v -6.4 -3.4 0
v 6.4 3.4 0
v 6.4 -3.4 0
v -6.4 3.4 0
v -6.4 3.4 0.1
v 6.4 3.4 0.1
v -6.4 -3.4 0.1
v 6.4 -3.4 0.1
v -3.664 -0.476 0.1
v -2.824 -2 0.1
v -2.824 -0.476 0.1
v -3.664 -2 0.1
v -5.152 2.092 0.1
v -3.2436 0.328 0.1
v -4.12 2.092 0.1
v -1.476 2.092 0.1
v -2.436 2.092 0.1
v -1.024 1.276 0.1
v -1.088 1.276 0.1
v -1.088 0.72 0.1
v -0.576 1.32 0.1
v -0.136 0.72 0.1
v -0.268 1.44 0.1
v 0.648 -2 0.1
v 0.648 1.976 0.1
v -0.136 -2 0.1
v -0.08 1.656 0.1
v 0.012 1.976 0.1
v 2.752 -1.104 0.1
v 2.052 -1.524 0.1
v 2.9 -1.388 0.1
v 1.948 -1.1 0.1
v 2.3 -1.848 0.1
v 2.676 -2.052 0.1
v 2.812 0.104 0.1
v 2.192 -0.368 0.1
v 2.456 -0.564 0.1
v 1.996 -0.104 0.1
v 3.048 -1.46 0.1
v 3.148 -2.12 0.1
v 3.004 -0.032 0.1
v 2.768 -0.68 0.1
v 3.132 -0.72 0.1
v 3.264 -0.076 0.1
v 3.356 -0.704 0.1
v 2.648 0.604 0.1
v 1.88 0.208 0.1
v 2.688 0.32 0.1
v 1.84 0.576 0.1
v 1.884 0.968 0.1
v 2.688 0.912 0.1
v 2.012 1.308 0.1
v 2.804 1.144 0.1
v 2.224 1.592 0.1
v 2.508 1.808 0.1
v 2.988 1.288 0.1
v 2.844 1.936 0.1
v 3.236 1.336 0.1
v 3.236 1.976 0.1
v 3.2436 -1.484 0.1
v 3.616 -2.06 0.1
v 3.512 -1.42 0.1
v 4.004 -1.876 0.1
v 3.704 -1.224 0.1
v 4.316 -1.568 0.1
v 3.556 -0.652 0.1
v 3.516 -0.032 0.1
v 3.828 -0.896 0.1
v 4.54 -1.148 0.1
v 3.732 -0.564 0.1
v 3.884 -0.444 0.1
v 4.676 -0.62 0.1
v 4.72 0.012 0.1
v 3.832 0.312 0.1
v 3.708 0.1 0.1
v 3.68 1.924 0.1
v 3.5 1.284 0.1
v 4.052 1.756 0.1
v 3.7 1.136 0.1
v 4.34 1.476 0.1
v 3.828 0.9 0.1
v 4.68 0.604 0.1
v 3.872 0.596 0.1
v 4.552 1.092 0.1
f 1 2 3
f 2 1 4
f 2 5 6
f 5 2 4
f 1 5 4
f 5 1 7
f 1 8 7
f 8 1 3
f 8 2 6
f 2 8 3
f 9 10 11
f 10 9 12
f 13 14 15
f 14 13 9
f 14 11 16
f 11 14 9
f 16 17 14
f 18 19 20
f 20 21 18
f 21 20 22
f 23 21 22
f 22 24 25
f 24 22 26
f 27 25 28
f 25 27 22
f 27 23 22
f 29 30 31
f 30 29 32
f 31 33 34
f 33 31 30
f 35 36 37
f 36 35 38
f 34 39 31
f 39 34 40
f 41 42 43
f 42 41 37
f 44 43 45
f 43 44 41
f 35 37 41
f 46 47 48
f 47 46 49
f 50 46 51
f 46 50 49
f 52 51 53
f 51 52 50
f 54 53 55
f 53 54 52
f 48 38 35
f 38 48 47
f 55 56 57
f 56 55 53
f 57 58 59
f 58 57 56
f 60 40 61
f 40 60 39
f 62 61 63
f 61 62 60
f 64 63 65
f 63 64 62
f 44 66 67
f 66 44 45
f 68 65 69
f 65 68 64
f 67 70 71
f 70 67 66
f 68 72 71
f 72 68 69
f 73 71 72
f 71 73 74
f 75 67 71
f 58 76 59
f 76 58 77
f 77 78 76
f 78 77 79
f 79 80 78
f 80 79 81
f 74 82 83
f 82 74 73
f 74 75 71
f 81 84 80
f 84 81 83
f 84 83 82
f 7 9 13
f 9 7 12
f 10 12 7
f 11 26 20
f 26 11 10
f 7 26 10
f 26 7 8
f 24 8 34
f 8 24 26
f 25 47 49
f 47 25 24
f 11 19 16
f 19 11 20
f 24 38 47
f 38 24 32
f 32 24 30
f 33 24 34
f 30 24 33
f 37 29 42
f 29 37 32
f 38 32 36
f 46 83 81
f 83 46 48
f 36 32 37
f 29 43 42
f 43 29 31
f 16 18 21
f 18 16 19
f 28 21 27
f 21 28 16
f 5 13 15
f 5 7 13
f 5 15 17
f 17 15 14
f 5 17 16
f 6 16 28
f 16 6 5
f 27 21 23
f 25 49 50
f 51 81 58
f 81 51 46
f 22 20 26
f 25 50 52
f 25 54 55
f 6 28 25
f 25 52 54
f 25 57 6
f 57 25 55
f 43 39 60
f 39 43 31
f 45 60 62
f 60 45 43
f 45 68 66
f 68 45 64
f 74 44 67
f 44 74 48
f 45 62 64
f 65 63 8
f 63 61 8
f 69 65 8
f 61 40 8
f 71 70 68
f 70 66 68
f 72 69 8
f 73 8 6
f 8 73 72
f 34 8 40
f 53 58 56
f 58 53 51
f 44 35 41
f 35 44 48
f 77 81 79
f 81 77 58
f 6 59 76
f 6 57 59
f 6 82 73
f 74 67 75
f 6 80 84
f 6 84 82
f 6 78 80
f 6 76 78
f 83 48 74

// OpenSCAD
// file: ../p/box5-12.scad
use <../lib.scad>
function ldraw_lib__box5_12() = [
// 0 Box with 5 Faces without Any Edges
// 0 Name: box5-12.dat
// 0 Author: Chris Dee [cwdee]
// 0 !LDRAW_ORG Primitive UPDATE 2009-02
// 0 !LICENSE Licensed under CC BY 2.0 and CC BY 4.0 : see CAreadme.txt
// 
// 0 BFC CERTIFY CCW
  [0,"BFC","CERTIFY"],
  [0,"BFC","CCW"],
// 
// 0 !HISTORY 2009-09-03 [PTadmin] Official Update 2009-02
// 
// 
// 4 16 1 1 1 1 1 -1 -1 1 -1 -1 1 1
  [4,16,1,1,1,1,1,-1,-1,1,-1,-1,1,1],
// 4 16 -1 0 1 1 0 1 1 1 1 -1 1 1
  [4,16,-1,0,1,1,0,1,1,1,1,-1,1,1],
// 4 16 -1 0 -1 -1 0 1 -1 1 1 -1 1 -1
  [4,16,-1,0,-1,-1,0,1,-1,1,1,-1,1,-1],
// 4 16 1 0 -1 -1 0 -1 -1 1 -1 1 1 -1
  [4,16,1,0,-1,-1,0,-1,-1,1,-1,1,1,-1],
// 4 16 1 0 1 1 0 -1 1 1 -1 1 1 1
  [4,16,1,0,1,1,0,-1,1,1,-1,1,1,1],
// 0
];
module ldraw_lib__box5_12(step=0, col=false, unit=2/5, alt=false, line=0.2, solid=!$preview)
    makepoly(ldraw_lib__box5_12(), step=step, col=col, unit=unit, alt=alt, line=line, solid=solid);
ldraw_lib__box5_12(line=0.2);
// main file
use <../lib.scad>
use <../p/box5-12.scad>
function ldraw_lib__820673n() = [
// 0 Sticker  0.9 x  1.6 with White "Y19" on Transparent Background
// 0 Name: 820673n.dat
// 0 Author: Takeshi Takahashi [RainbowDolphin]
// 0 !LDRAW_ORG Part UPDATE 2022-04
// 0 !LICENSE Licensed under CC BY 2.0 and CC BY 4.0 : see CAreadme.txt
// 
// 0 BFC CERTIFY CCW
  [0,"BFC","CERTIFY"],
  [0,"BFC","CCW"],
// 
// 0 !KEYWORDS harbour, Pilot boat, Seaport, Set 6542, ship
// 
// 0 !HISTORY 2022-07-18 [PTadmin] Official Update 2022-04
// 
// 
// 1 16 0 -0.25 0 16 0 0 0 0.25 0 0 0 8.5 box5-12.dat
  [1,16,0,-0.25,0,16,0,0,0,0.25,0,0,0,8.5, ldraw_lib__box5_12()],
// 0 BFC NOCLIP
  [0,"BFC","NOCLIP"],
// 4 15 -9.16 -0.25 -1.19 -9.16 -0.25 -5 -7.06 -0.25 -5 -7.06 -0.25 -1.19
  [4,15,-9.16,-0.25,-1.19,-9.16,-0.25,-5,-7.06,-0.25,-5,-7.06,-0.25,-1.19],
// 4 15 -8.109 -0.25 0.82 -10.3 -0.25 5.23 -12.88 -0.25 5.23 -9.16 -0.25 -1.19
  [4,15,-8.109,-0.25,0.82,-10.3,-0.25,5.23,-12.88,-0.25,5.23,-9.16,-0.25,-1.19],
// 4 15 -8.109 -0.25 0.82 -9.16 -0.25 -1.19 -7.06 -0.25 -1.19 -3.69 -0.25 5.23
  [4,15,-8.109,-0.25,0.82,-9.16,-0.25,-1.19,-7.06,-0.25,-1.19,-3.69,-0.25,5.23],
// 3 15 -3.69 -0.25 5.23 -6.09 -0.25 5.23 -8.109 -0.25 0.82
  [3,15,-3.69,-0.25,5.23,-6.09,-0.25,5.23,-8.109,-0.25,0.82],
// 3 15 -2.56 -0.25 3.19 -2.72 -0.25 3.19 -2.72 -0.25 1.8
  [3,15,-2.56,-0.25,3.19,-2.72,-0.25,3.19,-2.72,-0.25,1.8],
// 4 15 -1.44 -0.25 3.3 -2.56 -0.25 3.19 -2.72 -0.25 1.8 -0.34 -0.25 1.8
  [4,15,-1.44,-0.25,3.3,-2.56,-0.25,3.19,-2.72,-0.25,1.8,-0.34,-0.25,1.8],
// 3 15 -0.67 -0.25 3.6 -1.44 -0.25 3.3 -0.34 -0.25 1.8
  [3,15,-0.67,-0.25,3.6,-1.44,-0.25,3.3,-0.34,-0.25,1.8],
// 4 15 -0.34 -0.25 1.8 -0.34 -0.25 -5 1.62 -0.25 -5 1.62 -0.25 4.94
  [4,15,-0.34,-0.25,1.8,-0.34,-0.25,-5,1.62,-0.25,-5,1.62,-0.25,4.94],
// 4 15 1.62 -0.25 4.94 0.03 -0.25 4.94 -0.2 -0.25 4.14 -0.34 -0.25 1.8
  [4,15,1.62,-0.25,4.94,0.03,-0.25,4.94,-0.2,-0.25,4.14,-0.34,-0.25,1.8],
// 3 15 -0.2 -0.25 4.14 -0.67 -0.25 3.6 -0.34 -0.25 1.8
  [3,15,-0.2,-0.25,4.14,-0.67,-0.25,3.6,-0.34,-0.25,1.8],
// 4 15 6.88 -0.25 -2.76 4.87 -0.25 -2.75 5.13 -0.25 -3.81 7.25 -0.25 -3.47
  [4,15,6.88,-0.25,-2.76,4.87,-0.25,-2.75,5.13,-0.25,-3.81,7.25,-0.25,-3.47],
// 4 15 7.25 -0.25 -3.47 5.13 -0.25 -3.81 5.75 -0.25 -4.62 6.69 -0.25 -5.13
  [4,15,7.25,-0.25,-3.47,5.13,-0.25,-3.81,5.75,-0.25,-4.62,6.69,-0.25,-5.13],
// 4 15 7.03 -0.25 0.26 4.99 -0.25 -0.26 5.48 -0.25 -0.92 6.14 -0.25 -1.41
  [4,15,7.03,-0.25,0.26,4.99,-0.25,-0.26,5.48,-0.25,-0.92,6.14,-0.25,-1.41],
// 4 15 7.62 -0.25 -3.65 7.25 -0.25 -3.47 6.69 -0.25 -5.13 7.87 -0.25 -5.3
  [4,15,7.62,-0.25,-3.65,7.25,-0.25,-3.47,6.69,-0.25,-5.13,7.87,-0.25,-5.3],
// 4 15 6.92 -0.25 -1.7 7.83 -0.25 -1.8 7.51 -0.25 -0.08 6.14 -0.25 -1.41
  [4,15,6.92,-0.25,-1.7,7.83,-0.25,-1.8,7.51,-0.25,-0.08,6.14,-0.25,-1.41],
// 4 15 8.16 -0.25 -0.19 7.51 -0.25 -0.08 7.83 -0.25 -1.8 8.39 -0.25 -1.76
  [4,15,8.16,-0.25,-0.19,7.51,-0.25,-0.08,7.83,-0.25,-1.8,8.39,-0.25,-1.76],
// 3 15 7.03 -0.25 0.26 6.14 -0.25 -1.41 7.51 -0.25 -0.08
  [3,15,7.03,-0.25,0.26,6.14,-0.25,-1.41,7.51,-0.25,-0.08],
// 4 15 6.62 -0.25 1.51 4.6 -0.25 1.44 4.7 -0.25 0.52 6.72 -0.25 0.8
  [4,15,6.62,-0.25,1.51,4.6,-0.25,1.44,4.7,-0.25,0.52,6.72,-0.25,0.8],
// 4 15 4.71 -0.25 2.42 4.6 -0.25 1.44 6.62 -0.25 1.51 6.72 -0.25 2.28
  [4,15,4.71,-0.25,2.42,4.6,-0.25,1.44,6.62,-0.25,1.51,6.72,-0.25,2.28],
// 4 15 5.03 -0.25 3.27 4.71 -0.25 2.42 6.72 -0.25 2.28 7.01 -0.25 2.86
  [4,15,5.03,-0.25,3.27,4.71,-0.25,2.42,6.72,-0.25,2.28,7.01,-0.25,2.86],
// 4 15 5.56 -0.25 3.98 5.03 -0.25 3.27 7.01 -0.25 2.86 6.27 -0.25 4.52
  [4,15,5.56,-0.25,3.98,5.03,-0.25,3.27,7.01,-0.25,2.86,6.27,-0.25,4.52],
// 4 15 6.72 -0.25 0.8 4.7 -0.25 0.52 4.99 -0.25 -0.26 7.03 -0.25 0.26
  [4,15,6.72,-0.25,0.8,4.7,-0.25,0.52,4.99,-0.25,-0.26,7.03,-0.25,0.26],
// 4 15 6.27 -0.25 4.52 7.01 -0.25 2.86 7.47 -0.25 3.22 7.11 -0.25 4.84
  [4,15,6.27,-0.25,4.52,7.01,-0.25,2.86,7.47,-0.25,3.22,7.11,-0.25,4.84],
// 4 15 7.11 -0.25 4.84 7.47 -0.25 3.22 8.09 -0.25 3.34 8.09 -0.25 4.94
  [4,15,7.11,-0.25,4.84,7.47,-0.25,3.22,8.09,-0.25,3.34,8.09,-0.25,4.94],
// 4 15 8.109 -0.25 -3.71 7.62 -0.25 -3.65 7.87 -0.25 -5.3 9.04 -0.25 -5.15
  [4,15,8.109,-0.25,-3.71,7.62,-0.25,-3.65,7.87,-0.25,-5.3,9.04,-0.25,-5.15],
// 4 15 8.78 -0.25 -3.55 8.109 -0.25 -3.71 9.04 -0.25 -5.15 10.01 -0.25 -4.69
  [4,15,8.78,-0.25,-3.55,8.109,-0.25,-3.71,9.04,-0.25,-5.15,10.01,-0.25,-4.69],
// 4 15 9.26 -0.25 -3.06 8.78 -0.25 -3.55 10.01 -0.25 -4.69 10.79 -0.25 -3.92
  [4,15,9.26,-0.25,-3.06,8.78,-0.25,-3.55,10.01,-0.25,-4.69,10.79,-0.25,-3.92],
// 4 15 8.16 -0.25 -0.19 8.39 -0.25 -1.76 8.89 -0.25 -1.63 8.79 -0.25 -0.08
  [4,15,8.16,-0.25,-0.19,8.39,-0.25,-1.76,8.89,-0.25,-1.63,8.79,-0.25,-0.08],
// 4 15 9.26 -0.25 -3.06 10.79 -0.25 -3.92 11.35 -0.25 -2.87 9.57 -0.25 -2.24
  [4,15,9.26,-0.25,-3.06,10.79,-0.25,-3.92,11.35,-0.25,-2.87,9.57,-0.25,-2.24],
// 4 15 9.33 -0.25 -1.41 9.71 -0.25 -1.11 8.79 -0.25 -0.08 8.89 -0.25 -1.63
  [4,15,9.33,-0.25,-1.41,9.71,-0.25,-1.11,8.79,-0.25,-0.08,8.89,-0.25,-1.63],
// 4 15 11.69 -0.25 -1.55 9.71 -0.25 -1.11 9.57 -0.25 -2.24 11.35 -0.25 -2.87
  [4,15,11.69,-0.25,-1.55,9.71,-0.25,-1.11,9.57,-0.25,-2.24,11.35,-0.25,-2.87],
// 4 15 9.71 -0.25 -1.11 11.69 -0.25 -1.55 11.8 -0.25 0.03 9.58 -0.25 0.78
  [4,15,9.71,-0.25,-1.11,11.69,-0.25,-1.55,11.8,-0.25,0.03,9.58,-0.25,0.78],
// 3 15 9.27 -0.25 0.25 8.79 -0.25 -0.08 9.71 -0.25 -1.11
  [3,15,9.27,-0.25,0.25,8.79,-0.25,-0.08,9.71,-0.25,-1.11],
// 4 15 9.2 -0.25 4.81 8.09 -0.25 4.94 8.09 -0.25 3.34 8.75 -0.25 3.21
  [4,15,9.2,-0.25,4.81,8.09,-0.25,4.94,8.09,-0.25,3.34,8.75,-0.25,3.21],
// 4 15 8.75 -0.25 3.21 9.25 -0.25 2.84 10.13 -0.25 4.39 9.2 -0.25 4.81
  [4,15,8.75,-0.25,3.21,9.25,-0.25,2.84,10.13,-0.25,4.39,9.2,-0.25,4.81],
// 4 15 9.25 -0.25 2.84 9.57 -0.25 2.25 10.85 -0.25 3.69 10.13 -0.25 4.39
  [4,15,9.25,-0.25,2.84,9.57,-0.25,2.25,10.85,-0.25,3.69,10.13,-0.25,4.39],
// 4 15 11.7 -0.25 1.51 9.68 -0.25 1.49 9.58 -0.25 0.78 11.8 -0.25 0.03
  [4,15,11.7,-0.25,1.51,9.68,-0.25,1.49,9.58,-0.25,0.78,11.8,-0.25,0.03],
// 3 15 9.58 -0.25 0.78 9.27 -0.25 0.25 9.71 -0.25 -1.11
  [3,15,9.58,-0.25,0.78,9.27,-0.25,0.25,9.71,-0.25,-1.11],
// 4 15 11.38 -0.25 2.73 10.85 -0.25 3.69 9.57 -0.25 2.25 9.68 -0.25 1.49
  [4,15,11.38,-0.25,2.73,10.85,-0.25,3.69,9.57,-0.25,2.25,9.68,-0.25,1.49],
// 3 15 11.38 -0.25 2.73 9.68 -0.25 1.49 11.7 -0.25 1.51
  [3,15,11.38,-0.25,2.73,9.68,-0.25,1.49,11.7,-0.25,1.51],
// 0 BFC CLIP
  [0,"BFC","CLIP"],
// 4 16 -12.88 -0.25 5.23 -16 -0.25 -8.5 -9.16 -0.25 -5 -9.16 -0.25 -1.19
  [4,16,-12.88,-0.25,5.23,-16,-0.25,-8.5,-9.16,-0.25,-5,-9.16,-0.25,-1.19],
// 3 16 -7.06 -0.25 -5 -9.16 -0.25 -5 -16 -0.25 -8.5
  [3,16,-7.06,-0.25,-5,-9.16,-0.25,-5,-16,-0.25,-8.5],
// 4 16 -7.06 -0.25 -1.19 -7.06 -0.25 -5 -0.34 -0.25 -5 -2.72 -0.25 1.8
  [4,16,-7.06,-0.25,-1.19,-7.06,-0.25,-5,-0.34,-0.25,-5,-2.72,-0.25,1.8],
// 4 16 -0.34 -0.25 -5 -7.06 -0.25 -5 -16 -0.25 -8.5 16 -0.25 -8.5
  [4,16,-0.34,-0.25,-5,-7.06,-0.25,-5,-16,-0.25,-8.5,16,-0.25,-8.5],
// 4 16 1.62 -0.25 -5 -0.34 -0.25 -5 16 -0.25 -8.5 6.69 -0.25 -5.13
  [4,16,1.62,-0.25,-5,-0.34,-0.25,-5,16,-0.25,-8.5,6.69,-0.25,-5.13],
// 4 16 1.62 -0.25 4.94 1.62 -0.25 -5 4.7 -0.25 0.52 4.6 -0.25 1.44
  [4,16,1.62,-0.25,4.94,1.62,-0.25,-5,4.7,-0.25,0.52,4.6,-0.25,1.44],
// 4 16 -7.06 -0.25 -1.19 -2.72 -0.25 1.8 -2.72 -0.25 3.19 -3.69 -0.25 5.23
  [4,16,-7.06,-0.25,-1.19,-2.72,-0.25,1.8,-2.72,-0.25,3.19,-3.69,-0.25,5.23],
// 4 16 4.99 -0.25 -0.26 4.7 -0.25 0.52 1.62 -0.25 -5 4.87 -0.25 -2.75
  [4,16,4.99,-0.25,-0.26,4.7,-0.25,0.52,1.62,-0.25,-5,4.87,-0.25,-2.75],
// 3 16 4.87 -0.25 -2.75 1.62 -0.25 -5 5.13 -0.25 -3.81
  [3,16,4.87,-0.25,-2.75,1.62,-0.25,-5,5.13,-0.25,-3.81],
// 3 16 5.75 -0.25 -4.62 1.62 -0.25 -5 6.69 -0.25 -5.13
  [3,16,5.75,-0.25,-4.62,1.62,-0.25,-5,6.69,-0.25,-5.13],
// 3 16 5.13 -0.25 -3.81 1.62 -0.25 -5 5.75 -0.25 -4.62
  [3,16,5.13,-0.25,-3.81,1.62,-0.25,-5,5.75,-0.25,-4.62],
// 4 16 6.14 -0.25 -1.41 4.87 -0.25 -2.75 6.88 -0.25 -2.76 6.92 -0.25 -1.7
  [4,16,6.14,-0.25,-1.41,4.87,-0.25,-2.75,6.88,-0.25,-2.76,6.92,-0.25,-1.7],
// 3 16 4.99 -0.25 -0.26 4.87 -0.25 -2.75 5.48 -0.25 -0.92
  [3,16,4.99,-0.25,-0.26,4.87,-0.25,-2.75,5.48,-0.25,-0.92],
// 4 16 6.62 -0.25 1.51 6.72 -0.25 0.8 9.68 -0.25 1.49 9.57 -0.25 2.25
  [4,16,6.62,-0.25,1.51,6.72,-0.25,0.8,9.68,-0.25,1.49,9.57,-0.25,2.25],
// 3 16 5.48 -0.25 -0.92 4.87 -0.25 -2.75 6.14 -0.25 -1.41
  [3,16,5.48,-0.25,-0.92,4.87,-0.25,-2.75,6.14,-0.25,-1.41],
// 4 16 7.83 -0.25 -1.8 6.92 -0.25 -1.7 6.88 -0.25 -2.76 7.25 -0.25 -3.47
  [4,16,7.83,-0.25,-1.8,6.92,-0.25,-1.7,6.88,-0.25,-2.76,7.25,-0.25,-3.47],
// 4 16 -2.56 -0.25 3.19 -1.44 -0.25 3.3 -3.69 -0.25 5.23 -2.72 -0.25 3.19
  [4,16,-2.56,-0.25,3.19,-1.44,-0.25,3.3,-3.69,-0.25,5.23,-2.72,-0.25,3.19],
// 4 16 0.03 -0.25 4.94 -3.69 -0.25 5.23 -1.44 -0.25 3.3 -0.2 -0.25 4.14
  [4,16,0.03,-0.25,4.94,-3.69,-0.25,5.23,-1.44,-0.25,3.3,-0.2,-0.25,4.14],
// 3 16 -16 -0.25 8.5 -12.88 -0.25 5.23 -10.3 -0.25 5.23
  [3,16,-16,-0.25,8.5,-12.88,-0.25,5.23,-10.3,-0.25,5.23],
// 3 16 -16 -0.25 8.5 -16 -0.25 -8.5 -12.88 -0.25 5.23
  [3,16,-16,-0.25,8.5,-16,-0.25,-8.5,-12.88,-0.25,5.23],
// 3 16 -16 -0.25 8.5 -10.3 -0.25 5.23 -6.09 -0.25 5.23
  [3,16,-16,-0.25,8.5,-10.3,-0.25,5.23,-6.09,-0.25,5.23],
// 3 16 -6.09 -0.25 5.23 -10.3 -0.25 5.23 -8.109 -0.25 0.82
  [3,16,-6.09,-0.25,5.23,-10.3,-0.25,5.23,-8.109,-0.25,0.82],
// 3 16 -16 -0.25 8.5 -6.09 -0.25 5.23 -3.69 -0.25 5.23
  [3,16,-16,-0.25,8.5,-6.09,-0.25,5.23,-3.69,-0.25,5.23],
// 4 16 -16 -0.25 8.5 -3.69 -0.25 5.23 0.03 -0.25 4.94 16 -0.25 8.5
  [4,16,-16,-0.25,8.5,-3.69,-0.25,5.23,0.03,-0.25,4.94,16,-0.25,8.5],
// 3 16 -0.2 -0.25 4.14 -1.44 -0.25 3.3 -0.67 -0.25 3.6
  [3,16,-0.2,-0.25,4.14,-1.44,-0.25,3.3,-0.67,-0.25,3.6],
// 3 16 1.62 -0.25 4.94 4.6 -0.25 1.44 4.71 -0.25 2.42
  [3,16,1.62,-0.25,4.94,4.6,-0.25,1.44,4.71,-0.25,2.42],
// 4 16 6.72 -0.25 2.28 6.62 -0.25 1.51 9.57 -0.25 2.25 8.09 -0.25 3.34
  [4,16,6.72,-0.25,2.28,6.62,-0.25,1.51,9.57,-0.25,2.25,8.09,-0.25,3.34],
// 3 16 -0.34 -0.25 1.8 -2.72 -0.25 1.8 -0.34 -0.25 -5
  [3,16,-0.34,-0.25,1.8,-2.72,-0.25,1.8,-0.34,-0.25,-5],
// 3 16 1.62 -0.25 4.94 4.71 -0.25 2.42 5.03 -0.25 3.27
  [3,16,1.62,-0.25,4.94,4.71,-0.25,2.42,5.03,-0.25,3.27],
// 3 16 1.62 -0.25 4.94 5.56 -0.25 3.98 6.27 -0.25 4.52
  [3,16,1.62,-0.25,4.94,5.56,-0.25,3.98,6.27,-0.25,4.52],
// 3 16 16 -0.25 8.5 0.03 -0.25 4.94 1.62 -0.25 4.94
  [3,16,16,-0.25,8.5,0.03,-0.25,4.94,1.62,-0.25,4.94],
// 3 16 1.62 -0.25 4.94 5.03 -0.25 3.27 5.56 -0.25 3.98
  [3,16,1.62,-0.25,4.94,5.03,-0.25,3.27,5.56,-0.25,3.98],
// 4 16 1.62 -0.25 4.94 6.27 -0.25 4.52 7.11 -0.25 4.84 16 -0.25 8.5
  [4,16,1.62,-0.25,4.94,6.27,-0.25,4.52,7.11,-0.25,4.84,16,-0.25,8.5],
// 4 16 7.83 -0.25 -1.8 7.25 -0.25 -3.47 7.62 -0.25 -3.65 8.109 -0.25 -3.71
  [4,16,7.83,-0.25,-1.8,7.25,-0.25,-3.47,7.62,-0.25,-3.65,8.109,-0.25,-3.71],
// 4 16 8.109 -0.25 -3.71 8.78 -0.25 -3.55 8.39 -0.25 -1.76 7.83 -0.25 -1.8
  [4,16,8.109,-0.25,-3.71,8.78,-0.25,-3.55,8.39,-0.25,-1.76,7.83,-0.25,-1.8],
// 4 16 9.57 -0.25 -2.24 8.89 -0.25 -1.63 8.39 -0.25 -1.76 9.26 -0.25 -3.06
  [4,16,9.57,-0.25,-2.24,8.89,-0.25,-1.63,8.39,-0.25,-1.76,9.26,-0.25,-3.06],
// 4 16 8.16 -0.25 -0.19 8.79 -0.25 -0.08 9.58 -0.25 0.78 6.72 -0.25 0.8
  [4,16,8.16,-0.25,-0.19,8.79,-0.25,-0.08,9.58,-0.25,0.78,6.72,-0.25,0.8],
// 3 16 8.39 -0.25 -1.76 8.78 -0.25 -3.55 9.26 -0.25 -3.06
  [3,16,8.39,-0.25,-1.76,8.78,-0.25,-3.55,9.26,-0.25,-3.06],
// 3 16 10.79 -0.25 -3.92 10.01 -0.25 -4.69 16 -0.25 -8.5
  [3,16,10.79,-0.25,-3.92,10.01,-0.25,-4.69,16,-0.25,-8.5],
// 3 16 10.01 -0.25 -4.69 9.04 -0.25 -5.15 16 -0.25 -8.5
  [3,16,10.01,-0.25,-4.69,9.04,-0.25,-5.15,16,-0.25,-8.5],
// 3 16 11.35 -0.25 -2.87 10.79 -0.25 -3.92 16 -0.25 -8.5
  [3,16,11.35,-0.25,-2.87,10.79,-0.25,-3.92,16,-0.25,-8.5],
// 3 16 9.04 -0.25 -5.15 7.87 -0.25 -5.3 16 -0.25 -8.5
  [3,16,9.04,-0.25,-5.15,7.87,-0.25,-5.3,16,-0.25,-8.5],
// 3 16 9.71 -0.25 -1.11 9.33 -0.25 -1.41 9.57 -0.25 -2.24
  [3,16,9.71,-0.25,-1.11,9.33,-0.25,-1.41,9.57,-0.25,-2.24],
// 3 16 9.33 -0.25 -1.41 8.89 -0.25 -1.63 9.57 -0.25 -2.24
  [3,16,9.33,-0.25,-1.41,8.89,-0.25,-1.63,9.57,-0.25,-2.24],
// 3 16 11.69 -0.25 -1.55 11.35 -0.25 -2.87 16 -0.25 -8.5
  [3,16,11.69,-0.25,-1.55,11.35,-0.25,-2.87,16,-0.25,-8.5],
// 4 16 11.8 -0.25 0.03 11.69 -0.25 -1.55 16 -0.25 -8.5 16 -0.25 8.5
  [4,16,11.8,-0.25,0.03,11.69,-0.25,-1.55,16,-0.25,-8.5,16,-0.25,8.5],
// 3 16 6.69 -0.25 -5.13 16 -0.25 -8.5 7.87 -0.25 -5.3
  [3,16,6.69,-0.25,-5.13,16,-0.25,-8.5,7.87,-0.25,-5.3],
// 4 16 7.01 -0.25 2.86 6.72 -0.25 2.28 8.09 -0.25 3.34 7.47 -0.25 3.22
  [4,16,7.01,-0.25,2.86,6.72,-0.25,2.28,8.09,-0.25,3.34,7.47,-0.25,3.22],
// 4 16 6.72 -0.25 0.8 7.03 -0.25 0.26 7.51 -0.25 -0.08 8.16 -0.25 -0.19
  [4,16,6.72,-0.25,0.8,7.03,-0.25,0.26,7.51,-0.25,-0.08,8.16,-0.25,-0.19],
// 4 16 8.09 -0.25 3.34 9.57 -0.25 2.25 9.25 -0.25 2.84 8.75 -0.25 3.21
  [4,16,8.09,-0.25,3.34,9.57,-0.25,2.25,9.25,-0.25,2.84,8.75,-0.25,3.21],
// 3 16 16 -0.25 8.5 8.09 -0.25 4.94 9.2 -0.25 4.81
  [3,16,16,-0.25,8.5,8.09,-0.25,4.94,9.2,-0.25,4.81],
// 3 16 16 -0.25 8.5 7.11 -0.25 4.84 8.09 -0.25 4.94
  [3,16,16,-0.25,8.5,7.11,-0.25,4.84,8.09,-0.25,4.94],
// 3 16 16 -0.25 8.5 11.7 -0.25 1.51 11.8 -0.25 0.03
  [3,16,16,-0.25,8.5,11.7,-0.25,1.51,11.8,-0.25,0.03],
// 3 16 9.58 -0.25 0.78 8.79 -0.25 -0.08 9.27 -0.25 0.25
  [3,16,9.58,-0.25,0.78,8.79,-0.25,-0.08,9.27,-0.25,0.25],
// 3 16 16 -0.25 8.5 10.85 -0.25 3.69 11.38 -0.25 2.73
  [3,16,16,-0.25,8.5,10.85,-0.25,3.69,11.38,-0.25,2.73],
// 3 16 16 -0.25 8.5 11.38 -0.25 2.73 11.7 -0.25 1.51
  [3,16,16,-0.25,8.5,11.38,-0.25,2.73,11.7,-0.25,1.51],
// 3 16 16 -0.25 8.5 10.13 -0.25 4.39 10.85 -0.25 3.69
  [3,16,16,-0.25,8.5,10.13,-0.25,4.39,10.85,-0.25,3.69],
// 3 16 16 -0.25 8.5 9.2 -0.25 4.81 10.13 -0.25 4.39
  [3,16,16,-0.25,8.5,9.2,-0.25,4.81,10.13,-0.25,4.39],
// 3 16 9.68 -0.25 1.49 6.72 -0.25 0.8 9.58 -0.25 0.78
  [3,16,9.68,-0.25,1.49,6.72,-0.25,0.8,9.58,-0.25,0.78],
];
module ldraw_lib__820673n(step=0, col=false, unit=2/5, alt=false, line=0.2, solid=!$preview)
    makepoly(ldraw_lib__820673n(), step=step, col=col, unit=unit, alt=alt, line=line, solid=solid);
ldraw_lib__820673n(line=0.2);
